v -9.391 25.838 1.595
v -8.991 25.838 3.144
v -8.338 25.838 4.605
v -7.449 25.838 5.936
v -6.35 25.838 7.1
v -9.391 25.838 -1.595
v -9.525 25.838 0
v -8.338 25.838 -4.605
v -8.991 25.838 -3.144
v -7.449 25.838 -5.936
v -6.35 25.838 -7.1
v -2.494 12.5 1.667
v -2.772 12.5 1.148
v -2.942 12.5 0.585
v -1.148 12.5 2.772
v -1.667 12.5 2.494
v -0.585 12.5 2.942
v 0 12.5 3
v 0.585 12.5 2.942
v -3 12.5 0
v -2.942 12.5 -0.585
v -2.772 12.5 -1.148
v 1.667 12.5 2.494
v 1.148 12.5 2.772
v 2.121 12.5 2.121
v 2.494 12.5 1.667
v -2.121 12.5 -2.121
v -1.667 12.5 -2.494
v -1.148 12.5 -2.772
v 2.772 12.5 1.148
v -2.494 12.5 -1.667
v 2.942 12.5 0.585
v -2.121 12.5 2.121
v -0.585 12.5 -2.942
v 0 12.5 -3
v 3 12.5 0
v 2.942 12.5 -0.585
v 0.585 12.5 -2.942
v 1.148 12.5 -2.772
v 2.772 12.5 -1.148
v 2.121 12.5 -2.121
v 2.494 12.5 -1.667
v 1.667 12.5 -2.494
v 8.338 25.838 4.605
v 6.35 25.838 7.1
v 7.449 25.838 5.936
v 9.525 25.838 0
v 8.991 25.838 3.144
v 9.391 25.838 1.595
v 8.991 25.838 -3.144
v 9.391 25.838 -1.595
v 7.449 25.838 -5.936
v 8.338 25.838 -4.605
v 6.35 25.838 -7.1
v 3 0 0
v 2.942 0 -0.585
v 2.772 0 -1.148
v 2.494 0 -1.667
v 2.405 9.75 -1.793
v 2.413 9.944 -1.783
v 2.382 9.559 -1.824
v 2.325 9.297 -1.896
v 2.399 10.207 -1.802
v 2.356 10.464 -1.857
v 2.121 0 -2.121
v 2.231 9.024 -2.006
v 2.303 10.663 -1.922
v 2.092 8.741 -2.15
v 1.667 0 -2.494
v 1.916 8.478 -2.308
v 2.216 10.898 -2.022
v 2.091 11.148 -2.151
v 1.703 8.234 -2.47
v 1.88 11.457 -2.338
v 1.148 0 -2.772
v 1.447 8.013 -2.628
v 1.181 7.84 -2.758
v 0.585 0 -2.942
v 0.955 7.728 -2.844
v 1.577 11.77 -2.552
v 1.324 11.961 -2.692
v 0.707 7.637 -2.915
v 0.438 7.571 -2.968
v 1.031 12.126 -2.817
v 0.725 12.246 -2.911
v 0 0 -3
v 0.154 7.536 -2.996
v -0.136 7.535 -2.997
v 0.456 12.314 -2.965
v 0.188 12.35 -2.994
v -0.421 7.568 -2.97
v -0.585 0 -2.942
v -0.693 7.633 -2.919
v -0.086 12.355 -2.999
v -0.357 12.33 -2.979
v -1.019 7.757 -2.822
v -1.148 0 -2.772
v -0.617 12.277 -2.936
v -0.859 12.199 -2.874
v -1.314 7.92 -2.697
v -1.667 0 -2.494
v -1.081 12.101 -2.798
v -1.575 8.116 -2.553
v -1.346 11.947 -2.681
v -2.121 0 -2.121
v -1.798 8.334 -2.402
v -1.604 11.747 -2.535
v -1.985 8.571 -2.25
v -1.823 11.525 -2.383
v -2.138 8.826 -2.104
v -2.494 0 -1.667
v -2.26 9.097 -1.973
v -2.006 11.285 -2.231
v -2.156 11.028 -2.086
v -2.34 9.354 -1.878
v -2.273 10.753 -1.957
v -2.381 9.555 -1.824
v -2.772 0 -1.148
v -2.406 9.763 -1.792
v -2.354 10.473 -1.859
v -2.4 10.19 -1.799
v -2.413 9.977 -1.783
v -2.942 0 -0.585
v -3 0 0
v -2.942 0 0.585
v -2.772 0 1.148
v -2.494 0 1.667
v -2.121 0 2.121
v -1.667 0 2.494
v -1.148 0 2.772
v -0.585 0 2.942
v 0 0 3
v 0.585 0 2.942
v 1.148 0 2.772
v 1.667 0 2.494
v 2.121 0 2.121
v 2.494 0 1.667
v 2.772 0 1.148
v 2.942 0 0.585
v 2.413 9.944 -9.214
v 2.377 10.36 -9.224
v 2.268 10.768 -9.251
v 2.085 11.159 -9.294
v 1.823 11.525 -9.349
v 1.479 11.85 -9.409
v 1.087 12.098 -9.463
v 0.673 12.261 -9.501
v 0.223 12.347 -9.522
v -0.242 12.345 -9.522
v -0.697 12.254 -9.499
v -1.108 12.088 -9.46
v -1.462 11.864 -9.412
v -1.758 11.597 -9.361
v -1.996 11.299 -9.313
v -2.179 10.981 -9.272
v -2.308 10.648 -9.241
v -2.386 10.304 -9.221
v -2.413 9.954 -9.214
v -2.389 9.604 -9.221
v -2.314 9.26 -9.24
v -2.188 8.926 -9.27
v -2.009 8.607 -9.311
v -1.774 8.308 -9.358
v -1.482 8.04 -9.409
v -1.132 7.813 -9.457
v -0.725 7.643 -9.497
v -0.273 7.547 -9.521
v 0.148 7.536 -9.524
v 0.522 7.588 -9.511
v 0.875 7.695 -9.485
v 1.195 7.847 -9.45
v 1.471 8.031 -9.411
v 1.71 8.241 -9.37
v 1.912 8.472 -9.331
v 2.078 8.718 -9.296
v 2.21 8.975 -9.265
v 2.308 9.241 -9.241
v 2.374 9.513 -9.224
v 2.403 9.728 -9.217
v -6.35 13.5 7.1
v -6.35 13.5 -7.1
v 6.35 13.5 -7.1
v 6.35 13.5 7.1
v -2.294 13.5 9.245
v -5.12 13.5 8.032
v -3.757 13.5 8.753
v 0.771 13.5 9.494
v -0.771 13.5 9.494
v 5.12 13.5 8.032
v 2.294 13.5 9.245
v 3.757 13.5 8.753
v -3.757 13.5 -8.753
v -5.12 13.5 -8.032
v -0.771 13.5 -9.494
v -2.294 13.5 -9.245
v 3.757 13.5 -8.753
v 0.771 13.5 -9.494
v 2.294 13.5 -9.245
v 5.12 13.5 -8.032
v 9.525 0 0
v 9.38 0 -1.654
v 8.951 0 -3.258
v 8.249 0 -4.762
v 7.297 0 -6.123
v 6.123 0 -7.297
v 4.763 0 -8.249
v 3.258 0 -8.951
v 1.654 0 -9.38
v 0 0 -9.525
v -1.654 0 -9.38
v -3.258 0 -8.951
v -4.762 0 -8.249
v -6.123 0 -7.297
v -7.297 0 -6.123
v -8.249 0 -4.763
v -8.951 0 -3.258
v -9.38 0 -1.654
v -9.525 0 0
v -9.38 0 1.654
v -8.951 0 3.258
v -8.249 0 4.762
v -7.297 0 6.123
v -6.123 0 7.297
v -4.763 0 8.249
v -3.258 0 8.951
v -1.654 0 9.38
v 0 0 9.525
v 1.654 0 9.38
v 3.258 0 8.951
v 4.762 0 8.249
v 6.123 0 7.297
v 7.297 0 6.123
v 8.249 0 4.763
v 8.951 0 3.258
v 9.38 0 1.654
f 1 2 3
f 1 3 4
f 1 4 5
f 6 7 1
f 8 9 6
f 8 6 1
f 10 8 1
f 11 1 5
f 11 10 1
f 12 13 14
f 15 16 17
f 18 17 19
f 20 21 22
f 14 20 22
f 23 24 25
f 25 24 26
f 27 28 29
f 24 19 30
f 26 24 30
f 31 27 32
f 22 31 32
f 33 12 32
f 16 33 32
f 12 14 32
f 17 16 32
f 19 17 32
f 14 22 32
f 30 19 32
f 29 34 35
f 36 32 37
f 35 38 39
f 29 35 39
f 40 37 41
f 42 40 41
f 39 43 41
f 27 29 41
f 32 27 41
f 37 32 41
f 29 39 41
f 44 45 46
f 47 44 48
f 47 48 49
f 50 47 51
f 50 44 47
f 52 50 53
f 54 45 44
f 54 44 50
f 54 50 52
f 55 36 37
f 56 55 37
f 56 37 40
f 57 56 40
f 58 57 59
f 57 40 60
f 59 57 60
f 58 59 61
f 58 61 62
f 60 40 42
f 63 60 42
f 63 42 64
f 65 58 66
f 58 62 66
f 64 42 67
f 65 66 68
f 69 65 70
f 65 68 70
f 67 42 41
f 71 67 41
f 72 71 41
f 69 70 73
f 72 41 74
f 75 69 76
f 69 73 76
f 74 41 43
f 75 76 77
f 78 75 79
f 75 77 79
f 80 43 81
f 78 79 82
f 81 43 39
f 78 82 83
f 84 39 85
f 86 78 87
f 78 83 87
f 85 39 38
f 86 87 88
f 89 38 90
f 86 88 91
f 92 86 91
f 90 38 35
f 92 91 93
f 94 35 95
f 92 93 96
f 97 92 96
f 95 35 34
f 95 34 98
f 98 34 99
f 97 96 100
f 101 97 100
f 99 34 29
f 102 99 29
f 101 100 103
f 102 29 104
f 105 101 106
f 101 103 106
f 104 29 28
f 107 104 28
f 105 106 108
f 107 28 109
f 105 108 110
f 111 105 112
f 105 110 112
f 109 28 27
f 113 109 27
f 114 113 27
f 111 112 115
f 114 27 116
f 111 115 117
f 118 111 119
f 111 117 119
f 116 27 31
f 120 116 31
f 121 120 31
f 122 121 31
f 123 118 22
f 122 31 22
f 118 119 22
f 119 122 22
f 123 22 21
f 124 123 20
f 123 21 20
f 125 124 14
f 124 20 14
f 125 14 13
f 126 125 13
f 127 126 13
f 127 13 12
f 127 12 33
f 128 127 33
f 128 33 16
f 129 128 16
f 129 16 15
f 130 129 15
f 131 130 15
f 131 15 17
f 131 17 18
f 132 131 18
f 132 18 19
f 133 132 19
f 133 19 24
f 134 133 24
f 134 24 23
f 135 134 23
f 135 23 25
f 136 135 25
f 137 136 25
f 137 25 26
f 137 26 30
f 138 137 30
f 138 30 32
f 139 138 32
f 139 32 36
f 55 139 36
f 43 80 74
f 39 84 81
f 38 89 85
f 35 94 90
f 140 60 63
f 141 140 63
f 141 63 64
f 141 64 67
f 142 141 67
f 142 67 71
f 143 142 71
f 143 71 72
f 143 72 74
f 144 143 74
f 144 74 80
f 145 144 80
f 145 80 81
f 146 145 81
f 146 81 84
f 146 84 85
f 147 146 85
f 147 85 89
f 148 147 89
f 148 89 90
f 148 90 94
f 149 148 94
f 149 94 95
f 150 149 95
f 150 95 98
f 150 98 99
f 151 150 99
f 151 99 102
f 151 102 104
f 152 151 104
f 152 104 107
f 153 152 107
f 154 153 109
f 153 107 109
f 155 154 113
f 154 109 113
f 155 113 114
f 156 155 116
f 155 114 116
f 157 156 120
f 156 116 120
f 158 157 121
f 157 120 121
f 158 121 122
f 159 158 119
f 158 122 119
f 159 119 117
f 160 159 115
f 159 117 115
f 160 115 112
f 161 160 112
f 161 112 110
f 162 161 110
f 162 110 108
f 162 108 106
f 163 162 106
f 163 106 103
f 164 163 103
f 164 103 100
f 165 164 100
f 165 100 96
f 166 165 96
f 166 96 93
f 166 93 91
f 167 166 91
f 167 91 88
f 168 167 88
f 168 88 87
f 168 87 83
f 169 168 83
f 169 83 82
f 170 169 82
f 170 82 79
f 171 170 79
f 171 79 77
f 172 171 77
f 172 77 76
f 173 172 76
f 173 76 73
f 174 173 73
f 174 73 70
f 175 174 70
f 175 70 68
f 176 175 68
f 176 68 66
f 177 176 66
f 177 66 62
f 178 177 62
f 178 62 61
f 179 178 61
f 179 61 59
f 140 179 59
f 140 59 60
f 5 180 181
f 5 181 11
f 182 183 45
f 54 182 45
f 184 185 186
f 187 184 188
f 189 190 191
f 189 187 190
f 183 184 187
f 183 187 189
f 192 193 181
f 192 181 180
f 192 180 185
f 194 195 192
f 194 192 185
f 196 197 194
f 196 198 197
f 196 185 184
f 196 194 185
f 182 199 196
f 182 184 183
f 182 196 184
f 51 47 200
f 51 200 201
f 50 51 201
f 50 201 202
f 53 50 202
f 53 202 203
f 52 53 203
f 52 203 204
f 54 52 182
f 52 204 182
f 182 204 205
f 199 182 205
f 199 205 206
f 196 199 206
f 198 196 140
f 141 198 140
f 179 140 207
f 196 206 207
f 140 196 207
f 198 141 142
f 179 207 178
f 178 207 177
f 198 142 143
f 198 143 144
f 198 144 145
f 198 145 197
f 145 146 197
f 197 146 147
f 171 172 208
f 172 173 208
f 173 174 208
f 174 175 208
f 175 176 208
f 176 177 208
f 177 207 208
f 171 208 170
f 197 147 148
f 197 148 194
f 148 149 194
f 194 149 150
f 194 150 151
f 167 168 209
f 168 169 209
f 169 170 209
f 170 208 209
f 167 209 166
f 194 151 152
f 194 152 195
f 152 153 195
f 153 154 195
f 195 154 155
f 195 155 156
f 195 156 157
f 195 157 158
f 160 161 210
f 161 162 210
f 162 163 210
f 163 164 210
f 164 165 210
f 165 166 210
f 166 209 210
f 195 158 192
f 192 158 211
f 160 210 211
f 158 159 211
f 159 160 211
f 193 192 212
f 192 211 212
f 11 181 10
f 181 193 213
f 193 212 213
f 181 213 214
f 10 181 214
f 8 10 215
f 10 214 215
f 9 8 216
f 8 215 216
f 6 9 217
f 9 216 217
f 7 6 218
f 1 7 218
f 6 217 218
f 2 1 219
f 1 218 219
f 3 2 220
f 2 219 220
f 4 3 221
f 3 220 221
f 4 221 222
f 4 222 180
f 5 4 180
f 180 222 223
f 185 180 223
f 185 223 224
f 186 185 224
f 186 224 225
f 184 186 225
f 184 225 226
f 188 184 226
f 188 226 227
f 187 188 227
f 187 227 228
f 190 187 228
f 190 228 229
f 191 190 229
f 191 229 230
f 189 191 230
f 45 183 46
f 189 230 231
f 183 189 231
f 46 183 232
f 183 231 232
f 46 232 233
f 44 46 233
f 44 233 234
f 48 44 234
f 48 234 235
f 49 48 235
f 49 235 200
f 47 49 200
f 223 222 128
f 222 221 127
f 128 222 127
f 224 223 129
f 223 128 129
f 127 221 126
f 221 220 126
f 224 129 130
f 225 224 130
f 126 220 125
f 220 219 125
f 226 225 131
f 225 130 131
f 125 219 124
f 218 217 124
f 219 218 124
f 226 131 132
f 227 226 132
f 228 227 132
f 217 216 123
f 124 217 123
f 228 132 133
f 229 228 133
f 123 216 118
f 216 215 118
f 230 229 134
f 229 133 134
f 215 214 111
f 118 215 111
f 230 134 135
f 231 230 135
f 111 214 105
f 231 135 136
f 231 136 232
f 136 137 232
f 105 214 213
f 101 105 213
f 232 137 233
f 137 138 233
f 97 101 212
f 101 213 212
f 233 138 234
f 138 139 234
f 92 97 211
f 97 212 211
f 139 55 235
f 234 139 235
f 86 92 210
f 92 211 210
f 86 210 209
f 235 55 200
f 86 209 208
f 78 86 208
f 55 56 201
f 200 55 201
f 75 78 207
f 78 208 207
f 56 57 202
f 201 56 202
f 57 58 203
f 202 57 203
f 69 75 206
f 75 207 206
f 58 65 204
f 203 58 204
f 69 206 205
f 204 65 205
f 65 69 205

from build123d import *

# Parameters (mm, degrees)
SKETCH1_R               = 9.525
BOSS_EXTRUDE1_DEPTH     = 12.5
CUT_EXTRUDE1_REACH      = 20.377
SKETCH2_R               = 3
SKETCH3_R               = 9.525
BOSS_EXTRUDE2_DEPTH     = 13.3375
CUT_EXTRUDE2_DEPTH      = 13.3375
CUT_EXTRUDE2_DEPTH_BACK = 13.3375
SKETCH4_W               = 12.7
SKETCH4_H               = 12.3375
SKETCH5_R               = 2.413
CUT_EXTRUDE4_DEPTH      = 13.3375


with BuildPart() as part:
    # Sketch1 → Boss-Extrude1 (new body)
    with BuildSketch(Plane(origin=(0, 0, 0), x_dir=(1, 0, 0), z_dir=(0, 1, 0))):
        Circle(SKETCH1_R)
    extrude(amount=BOSS_EXTRUDE1_DEPTH)

    # Sketch2 → Cut-Extrude1 (cut, up to next)
    with BuildSketch(Plane(origin=(0, 12.5, 0), x_dir=(1, 0, 0), z_dir=(0, 1, 0)), mode=Mode.PRIVATE) as cut_extrude1_sk1:
        Circle(SKETCH2_R)
    cut_extrude1_tool1 = extrude(cut_extrude1_sk1.sketch, amount=-CUT_EXTRUDE1_REACH, mode=Mode.PRIVATE) & part.part
    add(cut_extrude1_tool1.solids().sort_by_distance((0, 12.5, 0))[0], mode=Mode.SUBTRACT)

    # Sketch3 → Boss-Extrude2 (add)
    with BuildSketch(Plane(origin=(0, 12.5, 0), x_dir=(1, 0, 0), z_dir=(0, 1, 0))):
        Circle(SKETCH3_R)
    extrude(amount=BOSS_EXTRUDE2_DEPTH)

    # Sketch4 → Cut-Extrude2 (cut, two sides: drawn at the far end of the back side and taken through both)
    with BuildSketch(Plane.XY.offset(-CUT_EXTRUDE2_DEPTH_BACK)):
        with Locations((0, 19.66875)):
            Rectangle(SKETCH4_W, SKETCH4_H)
    extrude(amount=CUT_EXTRUDE2_DEPTH + CUT_EXTRUDE2_DEPTH_BACK, mode=Mode.SUBTRACT)

    # Sketch5 → Cut-Extrude4 (cut)
    with BuildSketch(Plane.XY):
        with Locations((0, 9.944)):
            Circle(SKETCH5_R)
    extrude(amount=-CUT_EXTRUDE4_DEPTH, mode=Mode.SUBTRACT)


solid = part.part
